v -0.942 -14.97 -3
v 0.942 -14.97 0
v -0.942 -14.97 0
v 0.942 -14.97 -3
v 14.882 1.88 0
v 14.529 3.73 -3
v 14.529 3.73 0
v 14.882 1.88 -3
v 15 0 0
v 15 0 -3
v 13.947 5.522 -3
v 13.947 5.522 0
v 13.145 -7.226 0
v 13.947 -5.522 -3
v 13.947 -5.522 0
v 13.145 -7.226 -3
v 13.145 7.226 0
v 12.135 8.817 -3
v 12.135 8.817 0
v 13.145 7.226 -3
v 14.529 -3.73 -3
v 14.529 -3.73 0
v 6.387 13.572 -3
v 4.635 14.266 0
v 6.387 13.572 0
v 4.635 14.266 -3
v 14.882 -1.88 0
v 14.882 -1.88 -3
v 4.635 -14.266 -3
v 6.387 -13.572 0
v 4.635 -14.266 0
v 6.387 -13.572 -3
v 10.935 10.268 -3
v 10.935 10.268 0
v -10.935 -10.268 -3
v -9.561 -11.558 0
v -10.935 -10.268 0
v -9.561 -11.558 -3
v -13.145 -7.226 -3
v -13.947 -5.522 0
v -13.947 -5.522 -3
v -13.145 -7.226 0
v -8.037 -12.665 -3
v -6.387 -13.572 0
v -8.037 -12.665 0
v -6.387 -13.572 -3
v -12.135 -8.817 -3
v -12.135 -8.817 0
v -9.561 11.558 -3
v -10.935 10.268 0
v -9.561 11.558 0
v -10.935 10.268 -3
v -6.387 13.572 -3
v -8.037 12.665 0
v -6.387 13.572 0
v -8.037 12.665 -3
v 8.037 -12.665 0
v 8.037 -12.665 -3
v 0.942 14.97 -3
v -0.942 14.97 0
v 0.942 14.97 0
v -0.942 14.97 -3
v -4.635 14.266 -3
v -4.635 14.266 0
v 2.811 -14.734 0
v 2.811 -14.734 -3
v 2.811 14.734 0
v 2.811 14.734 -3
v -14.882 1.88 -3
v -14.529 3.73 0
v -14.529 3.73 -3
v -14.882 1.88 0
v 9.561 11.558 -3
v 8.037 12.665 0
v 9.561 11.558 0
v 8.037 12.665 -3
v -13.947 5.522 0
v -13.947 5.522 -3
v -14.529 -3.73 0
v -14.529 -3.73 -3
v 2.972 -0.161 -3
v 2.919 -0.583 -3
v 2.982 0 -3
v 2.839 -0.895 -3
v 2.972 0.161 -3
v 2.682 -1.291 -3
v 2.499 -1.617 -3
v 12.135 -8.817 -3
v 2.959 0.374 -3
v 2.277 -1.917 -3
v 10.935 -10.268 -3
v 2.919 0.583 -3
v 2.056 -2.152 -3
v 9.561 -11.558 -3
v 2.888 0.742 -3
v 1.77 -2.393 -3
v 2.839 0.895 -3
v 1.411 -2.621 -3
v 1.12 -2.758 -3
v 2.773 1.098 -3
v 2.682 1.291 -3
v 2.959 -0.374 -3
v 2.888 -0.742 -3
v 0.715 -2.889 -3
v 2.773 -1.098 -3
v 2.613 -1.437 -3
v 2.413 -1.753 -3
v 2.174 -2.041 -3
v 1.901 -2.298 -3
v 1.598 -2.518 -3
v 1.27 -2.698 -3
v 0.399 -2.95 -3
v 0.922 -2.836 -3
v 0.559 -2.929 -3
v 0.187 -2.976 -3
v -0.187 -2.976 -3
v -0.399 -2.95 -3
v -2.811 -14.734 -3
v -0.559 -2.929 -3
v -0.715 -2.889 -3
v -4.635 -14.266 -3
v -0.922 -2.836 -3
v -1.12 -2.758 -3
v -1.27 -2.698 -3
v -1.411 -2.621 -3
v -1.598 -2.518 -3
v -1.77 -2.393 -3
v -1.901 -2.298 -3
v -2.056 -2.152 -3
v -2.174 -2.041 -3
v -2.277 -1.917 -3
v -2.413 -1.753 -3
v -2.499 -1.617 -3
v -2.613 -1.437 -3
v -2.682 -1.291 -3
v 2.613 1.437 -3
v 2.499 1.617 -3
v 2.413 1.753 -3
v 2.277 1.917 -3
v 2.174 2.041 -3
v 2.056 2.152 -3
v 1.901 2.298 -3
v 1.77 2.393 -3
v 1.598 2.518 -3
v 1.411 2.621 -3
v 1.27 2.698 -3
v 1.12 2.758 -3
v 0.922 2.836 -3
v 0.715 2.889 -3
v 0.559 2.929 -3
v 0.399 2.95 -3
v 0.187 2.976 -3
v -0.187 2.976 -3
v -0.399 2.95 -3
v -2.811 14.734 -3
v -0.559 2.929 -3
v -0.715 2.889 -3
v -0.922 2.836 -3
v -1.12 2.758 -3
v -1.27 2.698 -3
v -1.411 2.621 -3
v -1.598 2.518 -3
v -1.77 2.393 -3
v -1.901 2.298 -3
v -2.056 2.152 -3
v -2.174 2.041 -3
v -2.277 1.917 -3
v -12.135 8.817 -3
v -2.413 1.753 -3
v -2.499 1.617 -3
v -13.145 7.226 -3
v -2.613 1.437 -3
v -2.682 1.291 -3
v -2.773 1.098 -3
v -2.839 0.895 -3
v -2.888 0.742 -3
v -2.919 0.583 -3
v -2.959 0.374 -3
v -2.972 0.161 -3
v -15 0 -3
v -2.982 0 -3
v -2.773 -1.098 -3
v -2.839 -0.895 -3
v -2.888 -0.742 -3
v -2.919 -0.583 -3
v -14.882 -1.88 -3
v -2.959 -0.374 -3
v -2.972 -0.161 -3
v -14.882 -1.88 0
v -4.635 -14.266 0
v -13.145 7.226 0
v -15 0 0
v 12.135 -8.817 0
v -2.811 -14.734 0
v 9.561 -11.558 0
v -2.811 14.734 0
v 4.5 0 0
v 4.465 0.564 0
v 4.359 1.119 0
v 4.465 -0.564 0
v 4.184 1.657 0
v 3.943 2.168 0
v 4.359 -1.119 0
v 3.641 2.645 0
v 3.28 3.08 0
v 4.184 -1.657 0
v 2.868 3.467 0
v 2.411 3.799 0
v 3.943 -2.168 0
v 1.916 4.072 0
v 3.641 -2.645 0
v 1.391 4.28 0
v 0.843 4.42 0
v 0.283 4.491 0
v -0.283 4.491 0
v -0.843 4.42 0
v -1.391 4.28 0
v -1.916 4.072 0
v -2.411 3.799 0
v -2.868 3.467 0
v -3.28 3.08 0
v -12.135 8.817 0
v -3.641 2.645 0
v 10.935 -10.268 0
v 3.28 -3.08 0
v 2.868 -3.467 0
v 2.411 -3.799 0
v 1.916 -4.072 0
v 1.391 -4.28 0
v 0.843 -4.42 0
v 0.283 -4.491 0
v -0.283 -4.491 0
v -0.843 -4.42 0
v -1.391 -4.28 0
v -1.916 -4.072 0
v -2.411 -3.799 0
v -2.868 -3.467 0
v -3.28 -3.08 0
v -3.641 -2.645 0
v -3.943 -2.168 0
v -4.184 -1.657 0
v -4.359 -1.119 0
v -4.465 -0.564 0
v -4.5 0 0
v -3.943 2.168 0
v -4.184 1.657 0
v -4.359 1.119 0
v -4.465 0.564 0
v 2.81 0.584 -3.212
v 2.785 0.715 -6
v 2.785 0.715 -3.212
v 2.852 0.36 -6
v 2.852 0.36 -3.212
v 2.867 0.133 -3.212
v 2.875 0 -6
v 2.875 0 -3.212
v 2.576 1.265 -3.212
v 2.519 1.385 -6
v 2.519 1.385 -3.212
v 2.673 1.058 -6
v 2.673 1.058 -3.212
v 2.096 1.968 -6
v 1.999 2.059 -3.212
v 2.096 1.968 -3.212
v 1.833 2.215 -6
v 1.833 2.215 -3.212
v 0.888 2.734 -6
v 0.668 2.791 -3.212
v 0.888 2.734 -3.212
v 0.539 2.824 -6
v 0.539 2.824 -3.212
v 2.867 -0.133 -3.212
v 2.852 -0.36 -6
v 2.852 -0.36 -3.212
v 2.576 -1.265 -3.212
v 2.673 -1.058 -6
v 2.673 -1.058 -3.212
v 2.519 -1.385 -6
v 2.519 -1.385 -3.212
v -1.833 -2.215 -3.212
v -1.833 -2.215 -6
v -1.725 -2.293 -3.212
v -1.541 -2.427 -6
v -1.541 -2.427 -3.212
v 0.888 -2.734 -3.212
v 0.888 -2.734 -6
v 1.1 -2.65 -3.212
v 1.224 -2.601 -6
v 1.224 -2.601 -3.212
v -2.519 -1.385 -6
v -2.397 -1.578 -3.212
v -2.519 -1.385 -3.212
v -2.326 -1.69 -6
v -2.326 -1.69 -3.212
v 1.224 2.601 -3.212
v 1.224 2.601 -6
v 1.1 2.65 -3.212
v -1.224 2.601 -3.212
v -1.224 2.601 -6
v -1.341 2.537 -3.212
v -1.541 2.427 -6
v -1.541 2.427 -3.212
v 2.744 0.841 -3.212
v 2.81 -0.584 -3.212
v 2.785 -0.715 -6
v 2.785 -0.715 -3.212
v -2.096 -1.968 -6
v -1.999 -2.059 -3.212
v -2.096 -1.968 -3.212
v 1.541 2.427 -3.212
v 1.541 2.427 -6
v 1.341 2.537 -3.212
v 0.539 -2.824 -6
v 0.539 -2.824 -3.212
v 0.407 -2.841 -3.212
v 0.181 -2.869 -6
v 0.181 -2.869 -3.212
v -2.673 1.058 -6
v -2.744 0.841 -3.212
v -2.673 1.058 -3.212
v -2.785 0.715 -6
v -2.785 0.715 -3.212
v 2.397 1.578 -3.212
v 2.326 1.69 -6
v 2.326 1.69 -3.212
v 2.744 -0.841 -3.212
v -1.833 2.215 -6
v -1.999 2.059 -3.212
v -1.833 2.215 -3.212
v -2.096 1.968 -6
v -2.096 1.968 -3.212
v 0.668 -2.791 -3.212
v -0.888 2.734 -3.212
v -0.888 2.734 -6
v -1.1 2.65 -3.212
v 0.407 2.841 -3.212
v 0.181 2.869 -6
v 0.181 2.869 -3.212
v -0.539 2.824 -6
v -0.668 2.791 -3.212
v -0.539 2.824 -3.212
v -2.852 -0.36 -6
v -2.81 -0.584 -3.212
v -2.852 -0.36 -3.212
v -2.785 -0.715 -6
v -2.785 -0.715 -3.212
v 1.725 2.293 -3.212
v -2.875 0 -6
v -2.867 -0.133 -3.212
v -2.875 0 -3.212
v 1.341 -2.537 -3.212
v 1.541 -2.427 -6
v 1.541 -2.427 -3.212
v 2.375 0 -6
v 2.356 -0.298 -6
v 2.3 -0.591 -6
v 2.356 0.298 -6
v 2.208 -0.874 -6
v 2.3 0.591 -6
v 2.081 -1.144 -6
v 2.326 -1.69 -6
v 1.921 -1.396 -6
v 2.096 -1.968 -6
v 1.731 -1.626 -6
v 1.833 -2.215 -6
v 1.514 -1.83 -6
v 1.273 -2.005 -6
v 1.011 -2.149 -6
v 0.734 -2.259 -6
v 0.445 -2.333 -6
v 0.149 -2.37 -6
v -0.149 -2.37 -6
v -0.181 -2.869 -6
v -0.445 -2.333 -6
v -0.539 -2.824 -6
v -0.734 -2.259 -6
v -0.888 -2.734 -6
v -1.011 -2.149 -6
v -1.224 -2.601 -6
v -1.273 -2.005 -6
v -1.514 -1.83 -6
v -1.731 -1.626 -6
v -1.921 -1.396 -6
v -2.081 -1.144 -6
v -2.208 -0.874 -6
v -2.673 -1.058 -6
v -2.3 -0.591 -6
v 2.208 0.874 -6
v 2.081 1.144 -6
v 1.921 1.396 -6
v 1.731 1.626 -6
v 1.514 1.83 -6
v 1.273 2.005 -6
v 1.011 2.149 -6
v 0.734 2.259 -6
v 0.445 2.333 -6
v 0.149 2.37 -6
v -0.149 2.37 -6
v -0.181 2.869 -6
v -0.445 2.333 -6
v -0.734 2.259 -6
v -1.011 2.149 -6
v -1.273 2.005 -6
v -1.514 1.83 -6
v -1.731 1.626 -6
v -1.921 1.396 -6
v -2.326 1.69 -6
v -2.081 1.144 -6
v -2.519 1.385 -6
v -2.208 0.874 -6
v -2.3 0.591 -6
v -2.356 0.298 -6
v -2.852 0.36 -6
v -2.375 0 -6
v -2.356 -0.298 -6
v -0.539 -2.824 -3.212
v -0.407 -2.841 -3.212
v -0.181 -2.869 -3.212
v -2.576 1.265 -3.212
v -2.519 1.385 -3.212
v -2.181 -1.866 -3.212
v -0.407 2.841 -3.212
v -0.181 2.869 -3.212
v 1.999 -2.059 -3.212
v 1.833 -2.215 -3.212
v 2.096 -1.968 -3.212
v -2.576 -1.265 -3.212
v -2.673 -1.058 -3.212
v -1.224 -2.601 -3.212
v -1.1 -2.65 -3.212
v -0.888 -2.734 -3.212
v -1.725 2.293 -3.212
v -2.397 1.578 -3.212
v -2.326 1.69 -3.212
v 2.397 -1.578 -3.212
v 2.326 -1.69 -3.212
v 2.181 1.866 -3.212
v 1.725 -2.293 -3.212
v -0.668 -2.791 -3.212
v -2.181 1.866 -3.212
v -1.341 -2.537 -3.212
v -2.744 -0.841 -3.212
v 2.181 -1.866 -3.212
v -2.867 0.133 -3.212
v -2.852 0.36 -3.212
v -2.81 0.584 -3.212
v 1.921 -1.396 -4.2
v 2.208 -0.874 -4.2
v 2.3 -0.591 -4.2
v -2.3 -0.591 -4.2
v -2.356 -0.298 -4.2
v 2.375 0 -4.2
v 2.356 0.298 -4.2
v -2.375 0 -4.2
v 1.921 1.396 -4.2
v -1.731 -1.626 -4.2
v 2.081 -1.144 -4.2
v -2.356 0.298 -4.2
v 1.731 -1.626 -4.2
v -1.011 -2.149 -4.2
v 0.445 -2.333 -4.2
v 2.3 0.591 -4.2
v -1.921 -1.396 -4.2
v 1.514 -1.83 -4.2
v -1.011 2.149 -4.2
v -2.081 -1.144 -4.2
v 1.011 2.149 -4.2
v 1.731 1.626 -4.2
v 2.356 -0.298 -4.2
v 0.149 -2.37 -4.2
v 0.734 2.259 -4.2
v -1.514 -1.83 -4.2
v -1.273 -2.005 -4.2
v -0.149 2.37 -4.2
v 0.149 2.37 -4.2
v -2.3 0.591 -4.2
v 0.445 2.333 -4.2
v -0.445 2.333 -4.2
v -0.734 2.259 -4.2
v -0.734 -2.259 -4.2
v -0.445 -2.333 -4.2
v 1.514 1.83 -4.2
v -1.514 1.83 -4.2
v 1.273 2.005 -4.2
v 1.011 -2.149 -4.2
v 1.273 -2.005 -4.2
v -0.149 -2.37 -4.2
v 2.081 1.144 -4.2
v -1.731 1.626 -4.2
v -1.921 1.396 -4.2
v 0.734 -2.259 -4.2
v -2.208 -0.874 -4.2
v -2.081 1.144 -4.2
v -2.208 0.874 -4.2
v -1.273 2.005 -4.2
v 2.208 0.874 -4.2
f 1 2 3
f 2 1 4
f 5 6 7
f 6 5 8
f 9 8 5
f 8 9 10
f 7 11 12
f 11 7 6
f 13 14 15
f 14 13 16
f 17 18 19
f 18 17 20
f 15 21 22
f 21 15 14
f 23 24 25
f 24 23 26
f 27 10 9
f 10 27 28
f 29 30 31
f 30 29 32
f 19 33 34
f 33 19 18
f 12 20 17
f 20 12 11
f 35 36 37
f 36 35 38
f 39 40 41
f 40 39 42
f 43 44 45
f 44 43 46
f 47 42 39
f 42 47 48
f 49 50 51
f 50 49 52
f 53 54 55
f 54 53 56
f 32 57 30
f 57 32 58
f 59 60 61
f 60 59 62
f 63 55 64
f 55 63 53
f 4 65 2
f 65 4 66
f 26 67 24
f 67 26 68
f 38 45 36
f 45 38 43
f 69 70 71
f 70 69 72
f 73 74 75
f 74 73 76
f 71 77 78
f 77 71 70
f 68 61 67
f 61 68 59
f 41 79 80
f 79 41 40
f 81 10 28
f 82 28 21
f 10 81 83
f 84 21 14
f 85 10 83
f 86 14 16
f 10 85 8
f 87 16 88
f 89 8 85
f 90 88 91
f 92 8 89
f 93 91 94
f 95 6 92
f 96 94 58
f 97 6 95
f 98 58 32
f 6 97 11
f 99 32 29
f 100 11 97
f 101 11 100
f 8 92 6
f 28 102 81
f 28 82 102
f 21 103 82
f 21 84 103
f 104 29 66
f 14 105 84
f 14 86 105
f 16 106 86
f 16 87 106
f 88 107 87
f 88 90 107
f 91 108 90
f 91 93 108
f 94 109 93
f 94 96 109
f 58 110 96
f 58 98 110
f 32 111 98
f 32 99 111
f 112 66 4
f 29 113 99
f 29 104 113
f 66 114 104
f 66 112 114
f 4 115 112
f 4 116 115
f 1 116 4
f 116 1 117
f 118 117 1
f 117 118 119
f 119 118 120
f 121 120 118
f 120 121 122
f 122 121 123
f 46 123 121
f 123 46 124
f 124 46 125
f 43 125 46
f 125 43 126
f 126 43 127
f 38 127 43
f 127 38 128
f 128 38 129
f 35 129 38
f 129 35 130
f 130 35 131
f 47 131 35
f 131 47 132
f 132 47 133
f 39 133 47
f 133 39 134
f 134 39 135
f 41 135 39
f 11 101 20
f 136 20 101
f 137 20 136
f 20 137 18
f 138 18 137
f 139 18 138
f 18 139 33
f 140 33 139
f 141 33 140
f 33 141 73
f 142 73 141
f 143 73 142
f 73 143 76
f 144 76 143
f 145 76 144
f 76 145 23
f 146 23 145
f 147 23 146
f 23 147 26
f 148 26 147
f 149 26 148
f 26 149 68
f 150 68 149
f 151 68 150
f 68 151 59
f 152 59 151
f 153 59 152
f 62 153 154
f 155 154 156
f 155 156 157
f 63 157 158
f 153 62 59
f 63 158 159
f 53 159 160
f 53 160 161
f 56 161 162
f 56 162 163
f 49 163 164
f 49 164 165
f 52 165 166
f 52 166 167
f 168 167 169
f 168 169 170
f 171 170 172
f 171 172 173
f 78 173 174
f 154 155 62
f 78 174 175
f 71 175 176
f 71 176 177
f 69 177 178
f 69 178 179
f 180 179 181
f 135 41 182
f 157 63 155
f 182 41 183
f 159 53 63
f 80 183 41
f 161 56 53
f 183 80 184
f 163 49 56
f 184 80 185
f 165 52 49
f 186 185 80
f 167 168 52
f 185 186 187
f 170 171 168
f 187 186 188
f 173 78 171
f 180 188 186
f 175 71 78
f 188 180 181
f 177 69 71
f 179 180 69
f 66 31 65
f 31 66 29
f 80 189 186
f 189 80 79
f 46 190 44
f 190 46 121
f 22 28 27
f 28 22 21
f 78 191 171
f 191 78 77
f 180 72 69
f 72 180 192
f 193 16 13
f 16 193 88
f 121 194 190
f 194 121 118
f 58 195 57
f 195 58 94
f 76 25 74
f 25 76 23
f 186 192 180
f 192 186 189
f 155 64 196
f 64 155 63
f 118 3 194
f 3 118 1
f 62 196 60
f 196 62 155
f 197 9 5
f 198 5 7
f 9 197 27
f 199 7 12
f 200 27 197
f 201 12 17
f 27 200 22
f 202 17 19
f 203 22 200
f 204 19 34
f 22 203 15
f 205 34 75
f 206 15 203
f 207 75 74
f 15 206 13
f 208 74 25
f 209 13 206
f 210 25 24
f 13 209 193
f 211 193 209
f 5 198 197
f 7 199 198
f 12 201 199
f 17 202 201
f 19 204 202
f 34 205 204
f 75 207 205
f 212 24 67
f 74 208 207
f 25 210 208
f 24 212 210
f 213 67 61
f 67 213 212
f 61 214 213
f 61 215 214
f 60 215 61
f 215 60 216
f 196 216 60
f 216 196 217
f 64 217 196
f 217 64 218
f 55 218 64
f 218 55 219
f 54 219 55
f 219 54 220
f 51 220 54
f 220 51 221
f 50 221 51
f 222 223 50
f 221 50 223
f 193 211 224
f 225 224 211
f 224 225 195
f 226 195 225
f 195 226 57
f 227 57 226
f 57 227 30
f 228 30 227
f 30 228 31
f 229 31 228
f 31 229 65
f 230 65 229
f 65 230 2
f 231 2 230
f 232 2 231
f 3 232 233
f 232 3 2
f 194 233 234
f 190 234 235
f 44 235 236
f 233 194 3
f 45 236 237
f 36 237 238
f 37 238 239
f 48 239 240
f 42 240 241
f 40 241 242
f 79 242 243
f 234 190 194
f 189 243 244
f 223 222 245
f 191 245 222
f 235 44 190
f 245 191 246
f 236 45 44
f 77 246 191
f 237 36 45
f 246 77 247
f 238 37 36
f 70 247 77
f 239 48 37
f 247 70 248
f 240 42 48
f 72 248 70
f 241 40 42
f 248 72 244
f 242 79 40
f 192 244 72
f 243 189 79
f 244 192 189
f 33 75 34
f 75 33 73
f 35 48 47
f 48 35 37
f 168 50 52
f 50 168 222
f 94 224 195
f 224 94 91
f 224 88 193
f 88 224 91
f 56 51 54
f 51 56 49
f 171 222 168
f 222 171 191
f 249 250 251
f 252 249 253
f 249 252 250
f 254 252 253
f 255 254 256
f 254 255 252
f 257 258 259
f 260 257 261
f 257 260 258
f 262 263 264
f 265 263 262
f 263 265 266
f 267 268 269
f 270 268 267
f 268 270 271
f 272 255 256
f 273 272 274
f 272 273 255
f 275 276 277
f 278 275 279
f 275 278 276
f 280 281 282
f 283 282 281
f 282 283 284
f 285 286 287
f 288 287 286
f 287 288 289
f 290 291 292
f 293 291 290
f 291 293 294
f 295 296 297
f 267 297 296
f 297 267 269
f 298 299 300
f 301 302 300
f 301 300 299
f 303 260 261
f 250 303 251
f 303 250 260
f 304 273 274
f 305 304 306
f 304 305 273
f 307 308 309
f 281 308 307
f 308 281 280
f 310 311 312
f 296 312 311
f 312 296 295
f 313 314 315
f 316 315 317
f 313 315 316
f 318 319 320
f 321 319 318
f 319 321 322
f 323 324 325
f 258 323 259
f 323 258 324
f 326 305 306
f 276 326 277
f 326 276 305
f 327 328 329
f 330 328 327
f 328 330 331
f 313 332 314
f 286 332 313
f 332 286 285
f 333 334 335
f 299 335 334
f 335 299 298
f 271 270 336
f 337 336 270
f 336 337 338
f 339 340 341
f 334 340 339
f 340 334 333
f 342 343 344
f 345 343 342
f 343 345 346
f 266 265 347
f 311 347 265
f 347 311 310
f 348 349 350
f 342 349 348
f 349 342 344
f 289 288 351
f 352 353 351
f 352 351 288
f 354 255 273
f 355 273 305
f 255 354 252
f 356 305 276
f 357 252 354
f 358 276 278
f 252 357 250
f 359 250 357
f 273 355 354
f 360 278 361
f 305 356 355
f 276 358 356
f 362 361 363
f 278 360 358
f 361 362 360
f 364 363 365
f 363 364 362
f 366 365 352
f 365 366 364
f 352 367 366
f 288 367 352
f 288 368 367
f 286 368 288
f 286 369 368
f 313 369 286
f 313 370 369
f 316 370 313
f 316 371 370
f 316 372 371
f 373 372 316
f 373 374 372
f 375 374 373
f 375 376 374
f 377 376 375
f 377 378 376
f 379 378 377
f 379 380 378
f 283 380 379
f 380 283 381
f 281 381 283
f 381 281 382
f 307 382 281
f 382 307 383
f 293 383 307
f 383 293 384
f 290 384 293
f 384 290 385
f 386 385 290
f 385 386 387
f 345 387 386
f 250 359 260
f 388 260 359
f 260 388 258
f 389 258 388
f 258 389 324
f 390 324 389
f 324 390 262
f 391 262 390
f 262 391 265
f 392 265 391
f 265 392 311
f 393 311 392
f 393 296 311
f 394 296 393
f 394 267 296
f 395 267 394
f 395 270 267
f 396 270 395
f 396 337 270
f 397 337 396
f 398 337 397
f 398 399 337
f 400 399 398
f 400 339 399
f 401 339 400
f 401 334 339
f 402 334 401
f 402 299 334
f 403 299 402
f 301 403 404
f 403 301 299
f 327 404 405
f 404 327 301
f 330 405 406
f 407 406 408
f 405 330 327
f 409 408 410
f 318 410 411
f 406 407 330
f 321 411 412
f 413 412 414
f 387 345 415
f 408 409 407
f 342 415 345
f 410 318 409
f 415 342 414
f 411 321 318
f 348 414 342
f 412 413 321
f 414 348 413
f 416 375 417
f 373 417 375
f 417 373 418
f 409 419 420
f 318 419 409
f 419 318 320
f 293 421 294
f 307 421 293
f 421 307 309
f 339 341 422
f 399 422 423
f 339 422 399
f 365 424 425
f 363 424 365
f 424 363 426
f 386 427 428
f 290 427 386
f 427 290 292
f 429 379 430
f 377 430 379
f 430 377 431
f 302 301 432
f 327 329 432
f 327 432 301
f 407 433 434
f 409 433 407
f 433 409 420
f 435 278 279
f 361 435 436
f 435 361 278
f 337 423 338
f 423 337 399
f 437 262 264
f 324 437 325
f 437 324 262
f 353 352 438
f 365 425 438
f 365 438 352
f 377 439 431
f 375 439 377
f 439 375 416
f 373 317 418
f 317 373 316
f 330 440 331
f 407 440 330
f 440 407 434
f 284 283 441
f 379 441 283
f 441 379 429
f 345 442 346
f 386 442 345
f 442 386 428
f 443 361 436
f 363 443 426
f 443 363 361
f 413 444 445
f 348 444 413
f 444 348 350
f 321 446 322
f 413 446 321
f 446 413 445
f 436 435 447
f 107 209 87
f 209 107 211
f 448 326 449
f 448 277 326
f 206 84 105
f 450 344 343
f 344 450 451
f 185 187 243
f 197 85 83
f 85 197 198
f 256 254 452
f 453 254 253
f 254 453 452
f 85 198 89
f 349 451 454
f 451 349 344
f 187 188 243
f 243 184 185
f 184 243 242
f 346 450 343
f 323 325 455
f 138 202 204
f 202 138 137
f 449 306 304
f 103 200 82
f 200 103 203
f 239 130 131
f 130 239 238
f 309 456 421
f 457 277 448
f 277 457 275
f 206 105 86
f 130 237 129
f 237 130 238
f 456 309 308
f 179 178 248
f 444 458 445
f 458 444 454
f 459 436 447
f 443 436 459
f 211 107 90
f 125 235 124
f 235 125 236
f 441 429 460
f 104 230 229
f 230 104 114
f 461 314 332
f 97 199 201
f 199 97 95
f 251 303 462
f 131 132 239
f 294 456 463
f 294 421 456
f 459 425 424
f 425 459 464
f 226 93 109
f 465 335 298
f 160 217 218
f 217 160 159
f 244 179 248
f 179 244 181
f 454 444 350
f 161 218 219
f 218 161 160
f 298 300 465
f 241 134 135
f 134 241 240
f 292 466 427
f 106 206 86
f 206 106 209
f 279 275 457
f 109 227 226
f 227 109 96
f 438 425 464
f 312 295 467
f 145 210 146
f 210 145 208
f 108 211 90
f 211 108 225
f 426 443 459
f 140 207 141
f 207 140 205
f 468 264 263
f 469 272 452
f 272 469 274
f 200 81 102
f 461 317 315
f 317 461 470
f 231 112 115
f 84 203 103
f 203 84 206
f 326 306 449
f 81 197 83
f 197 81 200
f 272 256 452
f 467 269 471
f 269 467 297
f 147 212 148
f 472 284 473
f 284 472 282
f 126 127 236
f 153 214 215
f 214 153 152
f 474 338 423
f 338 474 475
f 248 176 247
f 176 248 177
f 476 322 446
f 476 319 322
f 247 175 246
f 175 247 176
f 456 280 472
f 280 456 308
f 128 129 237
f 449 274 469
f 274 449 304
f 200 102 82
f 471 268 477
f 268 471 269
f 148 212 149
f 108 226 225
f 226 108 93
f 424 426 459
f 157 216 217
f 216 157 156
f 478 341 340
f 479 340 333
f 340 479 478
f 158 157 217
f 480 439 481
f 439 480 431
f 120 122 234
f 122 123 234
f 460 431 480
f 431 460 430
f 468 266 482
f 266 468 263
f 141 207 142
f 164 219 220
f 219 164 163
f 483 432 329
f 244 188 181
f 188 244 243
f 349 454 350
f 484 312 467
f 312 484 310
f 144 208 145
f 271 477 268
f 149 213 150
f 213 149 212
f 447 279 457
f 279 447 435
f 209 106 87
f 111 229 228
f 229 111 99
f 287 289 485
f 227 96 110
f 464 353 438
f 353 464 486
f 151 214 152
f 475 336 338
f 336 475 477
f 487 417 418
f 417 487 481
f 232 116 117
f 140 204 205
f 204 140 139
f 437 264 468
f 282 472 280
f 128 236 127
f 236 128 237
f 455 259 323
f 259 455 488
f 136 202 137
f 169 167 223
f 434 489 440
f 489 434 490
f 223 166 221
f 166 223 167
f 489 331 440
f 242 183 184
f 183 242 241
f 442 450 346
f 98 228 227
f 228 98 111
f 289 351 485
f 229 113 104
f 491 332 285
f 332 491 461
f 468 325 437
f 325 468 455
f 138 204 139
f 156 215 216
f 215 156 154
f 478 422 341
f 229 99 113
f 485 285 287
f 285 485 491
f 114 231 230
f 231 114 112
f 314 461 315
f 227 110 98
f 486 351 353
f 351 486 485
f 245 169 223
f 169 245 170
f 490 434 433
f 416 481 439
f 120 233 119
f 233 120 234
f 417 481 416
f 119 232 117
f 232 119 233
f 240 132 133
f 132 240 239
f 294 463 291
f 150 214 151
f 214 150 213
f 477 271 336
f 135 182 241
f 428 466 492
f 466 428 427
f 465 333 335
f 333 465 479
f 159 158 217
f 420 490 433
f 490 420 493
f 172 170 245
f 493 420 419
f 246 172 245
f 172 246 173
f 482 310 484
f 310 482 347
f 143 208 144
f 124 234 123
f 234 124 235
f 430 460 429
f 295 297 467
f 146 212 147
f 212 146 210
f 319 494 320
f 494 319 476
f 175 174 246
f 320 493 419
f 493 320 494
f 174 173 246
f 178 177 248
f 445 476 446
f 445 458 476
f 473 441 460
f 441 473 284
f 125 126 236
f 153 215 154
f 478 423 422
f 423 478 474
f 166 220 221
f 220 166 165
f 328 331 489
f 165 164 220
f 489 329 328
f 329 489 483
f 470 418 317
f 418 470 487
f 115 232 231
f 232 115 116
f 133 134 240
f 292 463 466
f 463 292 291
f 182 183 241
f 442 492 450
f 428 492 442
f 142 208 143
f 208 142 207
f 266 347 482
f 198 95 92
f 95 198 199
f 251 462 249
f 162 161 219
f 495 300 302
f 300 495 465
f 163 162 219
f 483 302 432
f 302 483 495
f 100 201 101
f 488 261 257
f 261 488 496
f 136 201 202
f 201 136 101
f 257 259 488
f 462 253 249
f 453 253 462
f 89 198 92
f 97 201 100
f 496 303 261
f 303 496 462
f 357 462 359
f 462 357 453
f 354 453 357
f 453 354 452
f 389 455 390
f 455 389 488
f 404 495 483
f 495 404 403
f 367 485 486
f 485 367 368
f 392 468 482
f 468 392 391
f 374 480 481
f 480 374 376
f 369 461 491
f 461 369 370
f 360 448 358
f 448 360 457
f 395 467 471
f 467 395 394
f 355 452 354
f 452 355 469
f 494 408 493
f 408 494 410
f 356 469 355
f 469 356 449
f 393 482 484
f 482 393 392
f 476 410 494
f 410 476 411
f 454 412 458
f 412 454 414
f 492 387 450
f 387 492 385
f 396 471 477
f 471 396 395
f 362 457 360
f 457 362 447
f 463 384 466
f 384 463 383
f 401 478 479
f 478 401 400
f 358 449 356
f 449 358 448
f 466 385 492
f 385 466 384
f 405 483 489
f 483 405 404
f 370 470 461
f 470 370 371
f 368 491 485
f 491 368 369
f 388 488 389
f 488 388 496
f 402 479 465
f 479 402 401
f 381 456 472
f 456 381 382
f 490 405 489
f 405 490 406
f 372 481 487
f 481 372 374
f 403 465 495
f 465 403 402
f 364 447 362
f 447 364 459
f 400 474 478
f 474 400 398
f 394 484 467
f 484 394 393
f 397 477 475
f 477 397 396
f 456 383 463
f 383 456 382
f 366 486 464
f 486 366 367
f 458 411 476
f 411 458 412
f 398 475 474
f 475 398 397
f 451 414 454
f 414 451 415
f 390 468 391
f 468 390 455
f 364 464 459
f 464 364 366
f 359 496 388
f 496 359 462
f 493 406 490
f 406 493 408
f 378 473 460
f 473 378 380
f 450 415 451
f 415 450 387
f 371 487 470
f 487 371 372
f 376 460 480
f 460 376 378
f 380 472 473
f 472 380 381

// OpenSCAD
$fn = 50;


difference() {
	union() {
		translate(v = [0, 0, -3.0000000000]) {
			cylinder(h = 3, r = 15.0000000000);
		}
		#translate(v = [0, 0, -6.0000000000]) {
			cylinder(h = 6, r = 2.8750000000);
		}
	}
	union() {
		translate(v = [0, 0, 0]) {
			rotate(a = [0, 0, 0]) {
				difference() {
					union() {
						translate(v = [0, 0, -6.0000000000]) {
							cylinder(h = 6, r = 2.2500000000);
						}
						translate(v = [0, 0, -4.2000000000]) {
							cylinder(h = 4.2000000000, r1 = 2.3750000000, r2 = 4.5000000000);
						}
						translate(v = [0, 0, -6.0000000000]) {
							cylinder(h = 6, r = 2.3750000000);
						}
						translate(v = [0, 0, -6.0000000000]) {
							cylinder(h = 6, r = 2.2500000000);
						}
					}
					union();
				}
			}
		}
	}
}
